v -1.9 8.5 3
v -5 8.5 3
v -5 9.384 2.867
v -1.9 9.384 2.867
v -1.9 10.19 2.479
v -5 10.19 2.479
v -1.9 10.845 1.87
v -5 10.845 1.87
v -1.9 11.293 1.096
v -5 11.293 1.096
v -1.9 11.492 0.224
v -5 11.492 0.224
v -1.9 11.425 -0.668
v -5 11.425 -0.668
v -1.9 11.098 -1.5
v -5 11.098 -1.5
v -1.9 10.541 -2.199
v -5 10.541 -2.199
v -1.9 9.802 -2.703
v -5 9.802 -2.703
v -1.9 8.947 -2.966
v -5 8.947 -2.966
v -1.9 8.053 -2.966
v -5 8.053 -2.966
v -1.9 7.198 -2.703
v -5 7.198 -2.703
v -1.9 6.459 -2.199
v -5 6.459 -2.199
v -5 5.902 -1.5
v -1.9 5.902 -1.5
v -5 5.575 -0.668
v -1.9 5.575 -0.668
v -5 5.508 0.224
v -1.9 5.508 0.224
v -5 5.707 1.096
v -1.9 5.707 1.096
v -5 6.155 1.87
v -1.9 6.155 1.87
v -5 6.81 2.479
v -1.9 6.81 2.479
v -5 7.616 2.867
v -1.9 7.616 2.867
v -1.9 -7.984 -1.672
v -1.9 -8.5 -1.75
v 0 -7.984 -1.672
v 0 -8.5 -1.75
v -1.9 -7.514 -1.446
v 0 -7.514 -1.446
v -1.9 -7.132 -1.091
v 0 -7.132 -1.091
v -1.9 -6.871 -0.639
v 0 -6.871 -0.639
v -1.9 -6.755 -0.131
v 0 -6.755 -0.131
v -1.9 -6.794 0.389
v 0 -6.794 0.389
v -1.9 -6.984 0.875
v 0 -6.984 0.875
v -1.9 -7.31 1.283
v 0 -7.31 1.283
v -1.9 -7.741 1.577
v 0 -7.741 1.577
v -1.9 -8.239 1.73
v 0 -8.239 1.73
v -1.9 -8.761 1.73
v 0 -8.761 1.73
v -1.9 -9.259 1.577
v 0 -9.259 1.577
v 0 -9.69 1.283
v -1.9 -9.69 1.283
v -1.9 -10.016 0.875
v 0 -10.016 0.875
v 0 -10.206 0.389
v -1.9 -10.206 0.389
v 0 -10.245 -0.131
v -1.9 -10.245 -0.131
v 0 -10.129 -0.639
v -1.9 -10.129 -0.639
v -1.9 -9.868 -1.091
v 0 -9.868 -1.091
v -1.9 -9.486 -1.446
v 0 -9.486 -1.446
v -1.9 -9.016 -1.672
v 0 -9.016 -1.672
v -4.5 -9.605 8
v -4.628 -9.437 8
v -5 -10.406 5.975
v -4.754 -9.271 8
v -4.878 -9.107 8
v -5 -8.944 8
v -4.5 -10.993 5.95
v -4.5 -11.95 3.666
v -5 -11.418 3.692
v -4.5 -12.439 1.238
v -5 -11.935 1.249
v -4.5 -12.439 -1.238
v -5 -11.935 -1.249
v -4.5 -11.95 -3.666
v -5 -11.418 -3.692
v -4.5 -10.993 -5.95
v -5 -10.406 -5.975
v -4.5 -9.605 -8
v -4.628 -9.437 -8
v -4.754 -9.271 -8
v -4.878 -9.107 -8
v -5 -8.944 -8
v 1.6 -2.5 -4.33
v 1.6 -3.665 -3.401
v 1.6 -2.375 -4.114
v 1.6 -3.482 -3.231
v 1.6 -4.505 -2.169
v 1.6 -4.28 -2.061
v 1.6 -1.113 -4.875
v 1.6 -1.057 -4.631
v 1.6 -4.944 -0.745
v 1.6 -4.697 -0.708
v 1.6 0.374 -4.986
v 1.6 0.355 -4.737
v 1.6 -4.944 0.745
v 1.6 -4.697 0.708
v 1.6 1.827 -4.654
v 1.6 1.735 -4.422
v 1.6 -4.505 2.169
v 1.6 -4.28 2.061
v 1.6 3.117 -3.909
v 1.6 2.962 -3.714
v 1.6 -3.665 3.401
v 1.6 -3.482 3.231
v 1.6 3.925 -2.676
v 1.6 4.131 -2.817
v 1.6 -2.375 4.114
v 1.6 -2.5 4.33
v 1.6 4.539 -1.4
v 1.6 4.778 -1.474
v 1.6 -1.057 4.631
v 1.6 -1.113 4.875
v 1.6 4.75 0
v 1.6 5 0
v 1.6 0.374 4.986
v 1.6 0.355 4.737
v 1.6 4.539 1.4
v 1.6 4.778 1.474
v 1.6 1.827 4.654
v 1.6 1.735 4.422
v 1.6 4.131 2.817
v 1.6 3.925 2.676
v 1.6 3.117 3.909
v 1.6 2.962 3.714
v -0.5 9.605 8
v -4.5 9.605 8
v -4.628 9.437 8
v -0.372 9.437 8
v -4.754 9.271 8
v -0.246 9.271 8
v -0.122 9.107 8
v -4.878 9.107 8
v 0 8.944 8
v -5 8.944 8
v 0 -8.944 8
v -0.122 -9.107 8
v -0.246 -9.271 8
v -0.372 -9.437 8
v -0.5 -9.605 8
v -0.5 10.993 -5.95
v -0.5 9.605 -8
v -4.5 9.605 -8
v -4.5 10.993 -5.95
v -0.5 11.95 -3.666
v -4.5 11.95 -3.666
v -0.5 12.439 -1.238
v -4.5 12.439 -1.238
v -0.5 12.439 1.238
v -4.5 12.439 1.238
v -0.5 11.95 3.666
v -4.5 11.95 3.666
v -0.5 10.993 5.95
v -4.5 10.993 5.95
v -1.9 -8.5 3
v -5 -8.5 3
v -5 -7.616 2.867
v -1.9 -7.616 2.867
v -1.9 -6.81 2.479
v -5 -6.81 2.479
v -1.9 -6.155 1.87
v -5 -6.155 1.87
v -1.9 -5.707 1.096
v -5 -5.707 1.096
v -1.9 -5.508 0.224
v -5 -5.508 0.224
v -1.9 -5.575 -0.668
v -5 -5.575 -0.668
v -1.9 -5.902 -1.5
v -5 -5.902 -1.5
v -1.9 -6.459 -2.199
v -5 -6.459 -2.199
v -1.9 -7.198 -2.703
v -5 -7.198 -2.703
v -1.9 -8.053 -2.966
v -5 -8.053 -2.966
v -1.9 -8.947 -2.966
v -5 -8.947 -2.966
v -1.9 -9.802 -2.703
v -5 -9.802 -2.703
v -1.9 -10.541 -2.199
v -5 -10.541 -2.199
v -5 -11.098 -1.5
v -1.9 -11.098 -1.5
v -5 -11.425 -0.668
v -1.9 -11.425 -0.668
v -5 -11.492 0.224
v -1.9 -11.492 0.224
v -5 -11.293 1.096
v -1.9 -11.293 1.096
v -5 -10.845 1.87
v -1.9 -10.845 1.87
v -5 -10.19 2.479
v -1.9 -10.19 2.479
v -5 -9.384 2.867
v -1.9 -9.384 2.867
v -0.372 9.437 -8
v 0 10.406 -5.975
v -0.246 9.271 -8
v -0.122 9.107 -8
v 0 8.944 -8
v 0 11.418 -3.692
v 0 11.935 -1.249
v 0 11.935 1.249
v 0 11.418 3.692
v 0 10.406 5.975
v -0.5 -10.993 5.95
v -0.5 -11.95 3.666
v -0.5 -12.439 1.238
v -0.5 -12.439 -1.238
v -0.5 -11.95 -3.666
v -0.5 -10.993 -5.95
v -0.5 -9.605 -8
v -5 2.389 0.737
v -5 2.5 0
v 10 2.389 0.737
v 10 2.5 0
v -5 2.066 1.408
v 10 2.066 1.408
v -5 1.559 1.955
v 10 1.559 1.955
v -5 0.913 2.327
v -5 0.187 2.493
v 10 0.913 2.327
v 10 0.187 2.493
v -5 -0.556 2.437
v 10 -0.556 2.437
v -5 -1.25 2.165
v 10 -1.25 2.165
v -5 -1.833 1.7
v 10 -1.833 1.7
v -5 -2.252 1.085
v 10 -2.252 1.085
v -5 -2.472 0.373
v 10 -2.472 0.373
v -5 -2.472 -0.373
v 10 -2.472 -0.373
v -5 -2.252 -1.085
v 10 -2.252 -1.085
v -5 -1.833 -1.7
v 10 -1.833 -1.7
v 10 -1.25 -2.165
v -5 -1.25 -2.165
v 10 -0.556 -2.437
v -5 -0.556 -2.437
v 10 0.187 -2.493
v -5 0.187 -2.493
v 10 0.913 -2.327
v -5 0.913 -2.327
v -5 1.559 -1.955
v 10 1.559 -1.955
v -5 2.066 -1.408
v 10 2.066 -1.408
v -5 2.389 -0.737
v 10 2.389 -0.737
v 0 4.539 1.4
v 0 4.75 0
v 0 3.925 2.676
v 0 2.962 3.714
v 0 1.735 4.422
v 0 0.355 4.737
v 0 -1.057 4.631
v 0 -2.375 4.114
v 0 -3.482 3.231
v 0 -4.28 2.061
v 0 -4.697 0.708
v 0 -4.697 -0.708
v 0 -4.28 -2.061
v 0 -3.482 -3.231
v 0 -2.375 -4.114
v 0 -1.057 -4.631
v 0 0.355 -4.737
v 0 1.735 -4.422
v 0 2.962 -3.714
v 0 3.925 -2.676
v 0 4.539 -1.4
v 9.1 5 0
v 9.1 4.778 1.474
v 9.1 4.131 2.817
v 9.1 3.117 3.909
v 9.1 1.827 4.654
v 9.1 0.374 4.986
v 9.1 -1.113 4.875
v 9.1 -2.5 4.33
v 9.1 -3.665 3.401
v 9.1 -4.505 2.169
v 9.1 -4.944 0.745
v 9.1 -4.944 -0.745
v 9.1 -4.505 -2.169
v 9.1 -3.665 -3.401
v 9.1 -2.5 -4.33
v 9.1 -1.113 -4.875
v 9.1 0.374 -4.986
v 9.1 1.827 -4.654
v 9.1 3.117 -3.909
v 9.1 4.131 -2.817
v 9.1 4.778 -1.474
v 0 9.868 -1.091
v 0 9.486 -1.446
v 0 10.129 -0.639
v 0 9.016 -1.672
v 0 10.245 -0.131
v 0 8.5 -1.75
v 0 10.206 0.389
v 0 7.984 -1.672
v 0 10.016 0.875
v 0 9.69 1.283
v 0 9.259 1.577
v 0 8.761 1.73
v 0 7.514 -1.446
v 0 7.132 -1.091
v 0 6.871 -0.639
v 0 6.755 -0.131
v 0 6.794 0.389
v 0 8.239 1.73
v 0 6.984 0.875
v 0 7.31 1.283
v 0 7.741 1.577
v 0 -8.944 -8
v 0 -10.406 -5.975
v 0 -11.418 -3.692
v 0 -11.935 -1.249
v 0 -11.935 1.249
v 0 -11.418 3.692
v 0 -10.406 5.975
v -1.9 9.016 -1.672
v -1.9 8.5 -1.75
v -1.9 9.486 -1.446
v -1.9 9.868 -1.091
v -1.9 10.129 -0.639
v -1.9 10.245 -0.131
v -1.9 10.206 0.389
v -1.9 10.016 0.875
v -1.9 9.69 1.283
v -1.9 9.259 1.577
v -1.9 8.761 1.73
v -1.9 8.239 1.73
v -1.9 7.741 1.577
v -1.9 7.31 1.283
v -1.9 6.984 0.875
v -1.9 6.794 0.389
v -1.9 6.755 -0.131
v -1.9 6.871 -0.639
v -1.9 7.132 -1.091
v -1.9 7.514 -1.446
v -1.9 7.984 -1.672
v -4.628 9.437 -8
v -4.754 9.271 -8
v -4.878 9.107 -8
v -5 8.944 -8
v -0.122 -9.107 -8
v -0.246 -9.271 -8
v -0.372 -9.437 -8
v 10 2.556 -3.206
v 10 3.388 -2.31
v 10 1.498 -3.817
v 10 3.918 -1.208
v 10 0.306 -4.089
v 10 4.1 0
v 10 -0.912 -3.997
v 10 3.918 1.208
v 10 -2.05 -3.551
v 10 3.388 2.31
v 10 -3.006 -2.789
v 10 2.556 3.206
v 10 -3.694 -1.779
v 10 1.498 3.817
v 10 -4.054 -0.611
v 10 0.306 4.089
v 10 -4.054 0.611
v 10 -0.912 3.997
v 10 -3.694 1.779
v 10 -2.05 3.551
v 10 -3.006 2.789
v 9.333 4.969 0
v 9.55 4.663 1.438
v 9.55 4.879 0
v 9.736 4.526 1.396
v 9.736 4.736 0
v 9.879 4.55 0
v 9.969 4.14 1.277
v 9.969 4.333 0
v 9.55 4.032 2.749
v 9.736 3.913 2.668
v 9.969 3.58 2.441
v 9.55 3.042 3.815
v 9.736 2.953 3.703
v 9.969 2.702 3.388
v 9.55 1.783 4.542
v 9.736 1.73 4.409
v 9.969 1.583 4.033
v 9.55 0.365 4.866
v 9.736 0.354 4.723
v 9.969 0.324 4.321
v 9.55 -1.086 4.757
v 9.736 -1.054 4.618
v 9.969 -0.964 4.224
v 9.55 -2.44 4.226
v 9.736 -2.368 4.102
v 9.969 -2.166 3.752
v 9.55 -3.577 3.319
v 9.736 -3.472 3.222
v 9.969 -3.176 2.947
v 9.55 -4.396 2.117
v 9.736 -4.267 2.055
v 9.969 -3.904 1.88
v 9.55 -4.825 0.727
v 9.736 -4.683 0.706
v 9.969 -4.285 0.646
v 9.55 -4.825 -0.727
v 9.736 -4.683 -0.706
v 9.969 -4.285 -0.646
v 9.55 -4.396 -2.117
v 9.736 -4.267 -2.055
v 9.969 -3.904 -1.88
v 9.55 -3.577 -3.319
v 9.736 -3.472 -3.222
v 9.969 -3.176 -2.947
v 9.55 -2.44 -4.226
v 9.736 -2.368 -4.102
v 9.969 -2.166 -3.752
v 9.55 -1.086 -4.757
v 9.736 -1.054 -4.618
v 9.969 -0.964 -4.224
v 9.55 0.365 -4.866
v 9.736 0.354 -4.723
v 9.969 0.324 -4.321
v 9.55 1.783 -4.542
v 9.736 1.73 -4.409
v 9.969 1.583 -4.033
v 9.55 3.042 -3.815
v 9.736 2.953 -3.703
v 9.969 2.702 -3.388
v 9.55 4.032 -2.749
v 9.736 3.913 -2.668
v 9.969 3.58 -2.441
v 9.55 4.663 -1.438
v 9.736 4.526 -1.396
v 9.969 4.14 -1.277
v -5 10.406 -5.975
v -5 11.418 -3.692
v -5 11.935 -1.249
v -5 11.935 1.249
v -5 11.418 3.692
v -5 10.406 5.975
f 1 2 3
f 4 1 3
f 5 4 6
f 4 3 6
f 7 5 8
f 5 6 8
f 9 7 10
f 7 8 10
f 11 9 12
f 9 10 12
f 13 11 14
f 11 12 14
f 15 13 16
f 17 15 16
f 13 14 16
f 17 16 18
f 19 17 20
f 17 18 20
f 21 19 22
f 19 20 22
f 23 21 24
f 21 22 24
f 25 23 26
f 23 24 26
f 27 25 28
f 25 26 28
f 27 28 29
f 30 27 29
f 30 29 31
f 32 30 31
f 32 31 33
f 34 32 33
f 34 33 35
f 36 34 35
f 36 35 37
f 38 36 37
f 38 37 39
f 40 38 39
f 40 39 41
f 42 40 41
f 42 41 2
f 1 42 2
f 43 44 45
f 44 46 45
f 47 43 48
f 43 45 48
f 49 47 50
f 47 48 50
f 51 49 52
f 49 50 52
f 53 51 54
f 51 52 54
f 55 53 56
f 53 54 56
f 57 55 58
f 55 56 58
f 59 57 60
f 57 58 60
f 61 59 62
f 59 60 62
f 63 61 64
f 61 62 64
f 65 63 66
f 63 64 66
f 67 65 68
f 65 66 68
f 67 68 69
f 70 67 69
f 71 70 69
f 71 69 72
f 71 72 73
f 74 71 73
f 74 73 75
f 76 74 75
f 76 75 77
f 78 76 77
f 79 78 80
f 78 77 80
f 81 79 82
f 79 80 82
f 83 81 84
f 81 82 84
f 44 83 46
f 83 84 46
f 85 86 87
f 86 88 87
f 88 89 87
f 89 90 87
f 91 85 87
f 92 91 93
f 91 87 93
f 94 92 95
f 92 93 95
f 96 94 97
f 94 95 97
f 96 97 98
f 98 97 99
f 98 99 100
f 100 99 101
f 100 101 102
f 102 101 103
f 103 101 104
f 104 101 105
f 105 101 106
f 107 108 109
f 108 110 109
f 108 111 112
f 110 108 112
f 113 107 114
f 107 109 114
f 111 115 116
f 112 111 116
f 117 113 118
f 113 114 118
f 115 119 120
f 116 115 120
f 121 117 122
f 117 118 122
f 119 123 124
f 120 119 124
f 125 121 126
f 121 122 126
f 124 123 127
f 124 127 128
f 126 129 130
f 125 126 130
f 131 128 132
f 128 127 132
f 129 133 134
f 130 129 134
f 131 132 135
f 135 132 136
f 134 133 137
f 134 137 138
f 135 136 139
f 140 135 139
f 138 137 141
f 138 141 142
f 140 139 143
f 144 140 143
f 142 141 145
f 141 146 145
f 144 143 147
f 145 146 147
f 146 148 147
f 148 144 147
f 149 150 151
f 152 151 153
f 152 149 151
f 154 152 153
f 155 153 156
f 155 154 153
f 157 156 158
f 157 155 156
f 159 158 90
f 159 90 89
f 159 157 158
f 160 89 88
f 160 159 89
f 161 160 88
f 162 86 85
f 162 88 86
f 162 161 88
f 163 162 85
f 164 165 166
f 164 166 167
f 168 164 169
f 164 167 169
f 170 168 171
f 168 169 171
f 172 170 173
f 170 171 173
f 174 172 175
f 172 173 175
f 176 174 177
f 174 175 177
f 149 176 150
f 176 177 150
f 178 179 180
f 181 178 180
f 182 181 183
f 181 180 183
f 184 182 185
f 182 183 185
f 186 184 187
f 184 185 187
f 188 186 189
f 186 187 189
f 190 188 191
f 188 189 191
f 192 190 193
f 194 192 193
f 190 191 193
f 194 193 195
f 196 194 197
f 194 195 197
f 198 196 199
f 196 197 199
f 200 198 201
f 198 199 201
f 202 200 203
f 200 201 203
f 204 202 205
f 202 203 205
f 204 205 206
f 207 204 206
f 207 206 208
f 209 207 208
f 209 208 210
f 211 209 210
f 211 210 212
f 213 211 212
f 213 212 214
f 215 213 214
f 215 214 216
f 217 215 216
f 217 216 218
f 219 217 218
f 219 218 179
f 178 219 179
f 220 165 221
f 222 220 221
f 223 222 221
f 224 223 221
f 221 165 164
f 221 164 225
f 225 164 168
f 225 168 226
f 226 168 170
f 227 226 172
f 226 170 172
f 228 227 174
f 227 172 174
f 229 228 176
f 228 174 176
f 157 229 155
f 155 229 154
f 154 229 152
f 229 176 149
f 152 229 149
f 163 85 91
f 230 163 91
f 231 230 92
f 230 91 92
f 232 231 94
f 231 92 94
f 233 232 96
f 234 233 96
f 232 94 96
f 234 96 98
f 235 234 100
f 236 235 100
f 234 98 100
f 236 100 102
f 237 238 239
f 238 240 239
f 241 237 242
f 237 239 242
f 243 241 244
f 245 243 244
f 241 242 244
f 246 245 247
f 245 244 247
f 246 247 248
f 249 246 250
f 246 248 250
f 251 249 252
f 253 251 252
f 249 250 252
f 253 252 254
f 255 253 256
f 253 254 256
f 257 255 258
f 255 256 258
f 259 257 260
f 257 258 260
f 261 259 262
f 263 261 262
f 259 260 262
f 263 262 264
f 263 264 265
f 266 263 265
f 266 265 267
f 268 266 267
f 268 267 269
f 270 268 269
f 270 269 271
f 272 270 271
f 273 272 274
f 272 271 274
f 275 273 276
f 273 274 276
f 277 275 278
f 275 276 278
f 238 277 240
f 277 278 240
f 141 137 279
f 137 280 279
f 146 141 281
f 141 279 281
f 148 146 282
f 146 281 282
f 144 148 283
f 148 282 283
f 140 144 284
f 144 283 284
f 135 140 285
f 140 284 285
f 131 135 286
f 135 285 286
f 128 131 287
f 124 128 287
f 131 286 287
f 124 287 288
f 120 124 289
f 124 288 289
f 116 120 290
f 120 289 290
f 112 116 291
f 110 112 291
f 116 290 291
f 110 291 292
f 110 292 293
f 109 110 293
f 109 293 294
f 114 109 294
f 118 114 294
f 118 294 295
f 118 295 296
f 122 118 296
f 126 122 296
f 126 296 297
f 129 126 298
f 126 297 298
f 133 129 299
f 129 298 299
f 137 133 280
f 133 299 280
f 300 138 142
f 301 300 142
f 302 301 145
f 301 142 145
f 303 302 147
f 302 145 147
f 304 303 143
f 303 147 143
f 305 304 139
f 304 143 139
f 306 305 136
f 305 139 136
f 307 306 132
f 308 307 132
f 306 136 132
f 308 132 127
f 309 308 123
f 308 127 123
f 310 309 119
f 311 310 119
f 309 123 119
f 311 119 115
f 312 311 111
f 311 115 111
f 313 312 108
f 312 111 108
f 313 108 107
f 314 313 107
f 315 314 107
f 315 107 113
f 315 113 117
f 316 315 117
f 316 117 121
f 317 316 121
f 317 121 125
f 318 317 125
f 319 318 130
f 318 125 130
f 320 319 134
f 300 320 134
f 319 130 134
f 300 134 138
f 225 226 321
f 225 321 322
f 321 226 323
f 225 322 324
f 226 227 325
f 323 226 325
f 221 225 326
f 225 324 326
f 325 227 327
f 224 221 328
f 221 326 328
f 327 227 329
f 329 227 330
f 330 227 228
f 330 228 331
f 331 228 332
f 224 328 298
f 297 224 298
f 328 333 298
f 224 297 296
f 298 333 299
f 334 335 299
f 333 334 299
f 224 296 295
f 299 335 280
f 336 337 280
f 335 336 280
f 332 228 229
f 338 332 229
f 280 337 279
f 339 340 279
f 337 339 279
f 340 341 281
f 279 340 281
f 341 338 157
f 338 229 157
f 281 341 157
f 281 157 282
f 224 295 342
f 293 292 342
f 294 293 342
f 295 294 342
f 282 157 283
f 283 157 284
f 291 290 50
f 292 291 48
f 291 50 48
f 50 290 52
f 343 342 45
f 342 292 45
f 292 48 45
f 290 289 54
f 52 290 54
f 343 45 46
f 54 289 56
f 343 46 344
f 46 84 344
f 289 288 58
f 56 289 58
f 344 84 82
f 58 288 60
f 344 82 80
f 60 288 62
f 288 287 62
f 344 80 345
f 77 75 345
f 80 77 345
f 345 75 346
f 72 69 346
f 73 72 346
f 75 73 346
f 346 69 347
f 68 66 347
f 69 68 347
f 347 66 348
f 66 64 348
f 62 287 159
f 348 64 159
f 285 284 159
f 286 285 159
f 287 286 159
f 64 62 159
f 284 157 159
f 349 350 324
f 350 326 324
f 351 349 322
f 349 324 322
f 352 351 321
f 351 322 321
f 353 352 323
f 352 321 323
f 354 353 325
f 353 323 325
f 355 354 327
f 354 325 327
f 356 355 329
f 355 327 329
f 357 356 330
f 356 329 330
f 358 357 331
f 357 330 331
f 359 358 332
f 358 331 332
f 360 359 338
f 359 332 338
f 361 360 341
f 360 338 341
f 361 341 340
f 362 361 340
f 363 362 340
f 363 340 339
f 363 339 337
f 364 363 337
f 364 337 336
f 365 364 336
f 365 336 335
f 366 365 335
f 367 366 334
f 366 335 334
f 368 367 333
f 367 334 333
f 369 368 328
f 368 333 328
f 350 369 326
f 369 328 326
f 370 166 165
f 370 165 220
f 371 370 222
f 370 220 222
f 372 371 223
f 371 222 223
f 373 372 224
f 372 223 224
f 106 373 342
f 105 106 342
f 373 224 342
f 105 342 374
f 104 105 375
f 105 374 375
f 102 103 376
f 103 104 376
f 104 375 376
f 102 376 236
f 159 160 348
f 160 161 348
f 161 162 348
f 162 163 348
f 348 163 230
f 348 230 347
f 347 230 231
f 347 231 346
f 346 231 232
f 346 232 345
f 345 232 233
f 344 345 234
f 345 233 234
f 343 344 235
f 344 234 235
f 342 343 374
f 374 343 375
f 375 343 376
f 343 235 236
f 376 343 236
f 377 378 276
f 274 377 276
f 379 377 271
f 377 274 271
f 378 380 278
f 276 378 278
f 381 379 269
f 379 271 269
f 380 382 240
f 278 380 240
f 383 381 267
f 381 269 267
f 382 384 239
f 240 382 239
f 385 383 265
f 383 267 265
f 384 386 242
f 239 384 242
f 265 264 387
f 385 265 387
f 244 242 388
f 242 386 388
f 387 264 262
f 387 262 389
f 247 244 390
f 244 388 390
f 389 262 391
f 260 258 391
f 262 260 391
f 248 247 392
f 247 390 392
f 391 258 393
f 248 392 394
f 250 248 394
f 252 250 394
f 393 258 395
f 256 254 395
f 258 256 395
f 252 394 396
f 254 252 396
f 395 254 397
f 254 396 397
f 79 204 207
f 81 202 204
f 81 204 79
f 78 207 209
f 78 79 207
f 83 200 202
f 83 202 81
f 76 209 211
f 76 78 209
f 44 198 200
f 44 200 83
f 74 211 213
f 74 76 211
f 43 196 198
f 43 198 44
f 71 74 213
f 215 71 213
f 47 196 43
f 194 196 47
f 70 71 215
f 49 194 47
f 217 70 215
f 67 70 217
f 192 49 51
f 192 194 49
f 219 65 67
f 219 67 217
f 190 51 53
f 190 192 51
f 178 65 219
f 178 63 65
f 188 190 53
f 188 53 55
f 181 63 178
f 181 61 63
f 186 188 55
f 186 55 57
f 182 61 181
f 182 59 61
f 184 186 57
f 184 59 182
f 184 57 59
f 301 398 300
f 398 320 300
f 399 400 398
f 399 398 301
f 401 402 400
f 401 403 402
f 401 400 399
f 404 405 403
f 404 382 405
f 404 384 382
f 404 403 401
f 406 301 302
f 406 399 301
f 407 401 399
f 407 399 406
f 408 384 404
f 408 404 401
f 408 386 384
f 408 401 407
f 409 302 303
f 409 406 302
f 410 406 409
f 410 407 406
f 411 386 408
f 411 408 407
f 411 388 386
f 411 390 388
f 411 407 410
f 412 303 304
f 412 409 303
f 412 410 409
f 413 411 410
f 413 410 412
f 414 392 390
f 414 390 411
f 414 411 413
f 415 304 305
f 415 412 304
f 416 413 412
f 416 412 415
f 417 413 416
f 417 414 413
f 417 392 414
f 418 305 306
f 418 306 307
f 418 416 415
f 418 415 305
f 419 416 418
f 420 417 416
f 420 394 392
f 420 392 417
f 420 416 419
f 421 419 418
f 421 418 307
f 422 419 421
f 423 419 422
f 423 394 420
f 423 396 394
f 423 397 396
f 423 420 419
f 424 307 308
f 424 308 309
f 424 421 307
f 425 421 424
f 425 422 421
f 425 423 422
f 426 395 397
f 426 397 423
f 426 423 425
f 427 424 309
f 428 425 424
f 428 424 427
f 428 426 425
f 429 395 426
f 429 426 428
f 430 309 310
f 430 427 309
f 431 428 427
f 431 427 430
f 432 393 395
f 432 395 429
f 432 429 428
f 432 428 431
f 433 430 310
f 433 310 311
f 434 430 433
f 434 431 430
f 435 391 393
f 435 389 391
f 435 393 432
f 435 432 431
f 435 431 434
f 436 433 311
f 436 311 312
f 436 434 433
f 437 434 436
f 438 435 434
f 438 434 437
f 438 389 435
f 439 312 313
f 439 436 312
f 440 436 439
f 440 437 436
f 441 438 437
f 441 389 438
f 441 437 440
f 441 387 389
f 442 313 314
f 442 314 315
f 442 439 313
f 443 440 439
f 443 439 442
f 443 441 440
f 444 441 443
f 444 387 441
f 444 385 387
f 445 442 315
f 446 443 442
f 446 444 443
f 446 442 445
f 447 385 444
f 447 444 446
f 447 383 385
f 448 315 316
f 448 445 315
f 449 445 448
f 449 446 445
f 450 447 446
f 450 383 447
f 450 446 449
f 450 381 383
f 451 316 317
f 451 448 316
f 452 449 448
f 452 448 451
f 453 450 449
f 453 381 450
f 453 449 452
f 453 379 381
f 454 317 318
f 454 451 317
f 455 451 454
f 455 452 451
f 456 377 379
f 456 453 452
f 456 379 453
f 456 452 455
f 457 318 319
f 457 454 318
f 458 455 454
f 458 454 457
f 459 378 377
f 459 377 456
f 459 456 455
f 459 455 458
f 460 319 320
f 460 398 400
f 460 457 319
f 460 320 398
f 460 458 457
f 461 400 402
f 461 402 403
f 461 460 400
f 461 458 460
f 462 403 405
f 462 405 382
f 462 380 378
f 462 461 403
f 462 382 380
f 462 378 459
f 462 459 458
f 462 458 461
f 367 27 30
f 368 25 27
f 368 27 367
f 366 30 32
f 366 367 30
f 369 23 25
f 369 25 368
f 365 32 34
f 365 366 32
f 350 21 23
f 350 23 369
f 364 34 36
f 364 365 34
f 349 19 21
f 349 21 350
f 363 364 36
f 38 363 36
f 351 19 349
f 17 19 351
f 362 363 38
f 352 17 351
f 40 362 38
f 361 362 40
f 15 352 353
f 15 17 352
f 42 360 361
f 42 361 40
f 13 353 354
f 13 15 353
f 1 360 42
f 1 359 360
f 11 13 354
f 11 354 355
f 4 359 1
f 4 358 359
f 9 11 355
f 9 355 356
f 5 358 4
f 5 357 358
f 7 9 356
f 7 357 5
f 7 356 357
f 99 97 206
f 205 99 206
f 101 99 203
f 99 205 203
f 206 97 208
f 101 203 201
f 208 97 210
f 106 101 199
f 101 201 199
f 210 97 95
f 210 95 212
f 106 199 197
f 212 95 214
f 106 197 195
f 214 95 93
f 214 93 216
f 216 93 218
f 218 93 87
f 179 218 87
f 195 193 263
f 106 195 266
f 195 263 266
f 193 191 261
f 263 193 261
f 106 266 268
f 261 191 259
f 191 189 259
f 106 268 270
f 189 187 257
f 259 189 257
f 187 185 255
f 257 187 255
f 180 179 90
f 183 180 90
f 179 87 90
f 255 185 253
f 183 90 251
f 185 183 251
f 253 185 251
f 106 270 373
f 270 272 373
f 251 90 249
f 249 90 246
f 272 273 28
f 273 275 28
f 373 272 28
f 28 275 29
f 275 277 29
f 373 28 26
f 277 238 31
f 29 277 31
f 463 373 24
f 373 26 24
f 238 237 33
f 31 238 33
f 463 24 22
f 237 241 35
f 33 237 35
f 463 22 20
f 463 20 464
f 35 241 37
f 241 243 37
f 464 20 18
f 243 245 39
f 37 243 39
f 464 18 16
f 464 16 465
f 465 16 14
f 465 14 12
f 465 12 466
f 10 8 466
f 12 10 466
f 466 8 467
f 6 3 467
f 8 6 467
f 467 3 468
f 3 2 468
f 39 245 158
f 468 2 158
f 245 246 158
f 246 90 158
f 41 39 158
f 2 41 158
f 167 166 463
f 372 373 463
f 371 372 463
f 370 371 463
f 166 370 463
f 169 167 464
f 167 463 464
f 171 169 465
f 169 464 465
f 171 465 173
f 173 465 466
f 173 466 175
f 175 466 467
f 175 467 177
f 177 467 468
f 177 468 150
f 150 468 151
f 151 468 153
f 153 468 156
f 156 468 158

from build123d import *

# Parameters (mm, degrees)
CHAMFER1_SIZE          = 0.5
FILLET1_R              = 0.9
CUT_EXTRUDE2_DEPTH     = 6
CAP_SCREW2_D           = 3.5
CAP_SCREW2_CBORE_D     = 6
CAP_SCREW2_CBORE_DEPTH = 3.1


with BuildPart() as part:
    # Sketch1 → Revolve1 (revolve)
    with BuildSketch(Plane.XY):
        Polygon((-5, 2.5), (10, 2.5), (10, 5), (1.6, 5), (1.6, 4.75), (0, 4.75), (0, 12.5), (-5, 12.5), align=None)
    revolve(axis=Axis((-5, 0, 0), (1, 0, 0)))

    # Chamfer1
    chamfer1_edges = [part.edges().sort_by_distance(p)[0] for p in [
        (0, -12.5, 0),
        (-5, -12.5, 0),
    ]]
    chamfer(chamfer1_edges, length=CHAMFER1_SIZE)

    # Fillet1
    fillet1_edges = [part.edges().sort_by_distance(p)[0] for p in [
        (10, -5, 0),
    ]]
    fillet(fillet1_edges, radius=FILLET1_R)

    # Sketch5 → Cut-Extrude2 (cut, through all)
    with BuildSketch(Plane.ZY):
        with BuildLine():
            Line((-8, 9.604686356), (-8, -9.604686356))
            ThreePointArc((-8, -9.604686356), (-12.5, 0), (-8, 9.604686356))
        make_face()
        with BuildLine():
            Line((8, 9.604686356), (8, -9.604686356))
            ThreePointArc((8, -9.604686356), (12.5, 0), (8, 9.604686356))
        make_face()
    extrude(amount=CUT_EXTRUDE2_DEPTH, mode=Mode.SUBTRACT)

    # Cap Screw2 (through all)
    with Locations(Plane.ZY.offset(5)):
        with Locations((0, -8.5), (0, 8.5)):
            CounterBoreHole(CAP_SCREW2_D / 2, CAP_SCREW2_CBORE_D / 2, CAP_SCREW2_CBORE_DEPTH)


solid = part.part
